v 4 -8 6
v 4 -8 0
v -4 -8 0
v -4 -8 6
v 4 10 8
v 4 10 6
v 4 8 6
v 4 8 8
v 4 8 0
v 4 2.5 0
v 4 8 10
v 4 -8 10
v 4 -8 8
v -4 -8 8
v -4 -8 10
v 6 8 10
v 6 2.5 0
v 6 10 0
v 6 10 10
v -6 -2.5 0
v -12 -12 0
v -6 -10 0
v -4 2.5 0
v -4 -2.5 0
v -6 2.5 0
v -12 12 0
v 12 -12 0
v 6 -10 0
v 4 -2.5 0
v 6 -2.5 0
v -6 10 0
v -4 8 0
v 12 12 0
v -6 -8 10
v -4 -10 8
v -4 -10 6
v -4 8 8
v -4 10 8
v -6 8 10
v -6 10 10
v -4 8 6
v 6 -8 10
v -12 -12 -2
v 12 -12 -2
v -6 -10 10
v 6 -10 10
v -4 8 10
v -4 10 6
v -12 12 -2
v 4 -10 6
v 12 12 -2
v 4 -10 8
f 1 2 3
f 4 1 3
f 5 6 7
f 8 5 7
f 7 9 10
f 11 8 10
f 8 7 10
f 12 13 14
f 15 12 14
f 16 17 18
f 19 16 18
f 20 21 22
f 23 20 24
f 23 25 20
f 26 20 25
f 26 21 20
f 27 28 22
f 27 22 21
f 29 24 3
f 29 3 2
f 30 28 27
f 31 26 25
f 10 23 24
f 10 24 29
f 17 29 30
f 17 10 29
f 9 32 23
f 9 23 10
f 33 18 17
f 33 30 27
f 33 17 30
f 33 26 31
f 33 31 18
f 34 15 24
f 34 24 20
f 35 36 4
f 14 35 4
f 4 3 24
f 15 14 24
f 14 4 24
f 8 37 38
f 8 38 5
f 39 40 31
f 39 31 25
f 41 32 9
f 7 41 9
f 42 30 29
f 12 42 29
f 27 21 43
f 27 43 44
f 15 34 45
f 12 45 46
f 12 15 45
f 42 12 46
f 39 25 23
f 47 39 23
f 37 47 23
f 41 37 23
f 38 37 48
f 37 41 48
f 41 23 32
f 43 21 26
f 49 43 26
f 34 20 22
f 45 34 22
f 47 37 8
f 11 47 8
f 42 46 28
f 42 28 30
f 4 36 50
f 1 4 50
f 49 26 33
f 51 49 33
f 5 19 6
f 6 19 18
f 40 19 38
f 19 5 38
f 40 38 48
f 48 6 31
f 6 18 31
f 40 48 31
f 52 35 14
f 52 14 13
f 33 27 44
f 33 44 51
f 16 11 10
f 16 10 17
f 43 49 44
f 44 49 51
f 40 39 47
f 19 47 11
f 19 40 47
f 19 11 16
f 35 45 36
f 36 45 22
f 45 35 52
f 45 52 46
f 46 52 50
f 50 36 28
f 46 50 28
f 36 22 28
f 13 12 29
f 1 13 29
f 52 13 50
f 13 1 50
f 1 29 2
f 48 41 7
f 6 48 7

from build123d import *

# Parameters (mm, degrees)
F0_W     = 24
F0_H     = 24
F1_DEPTH = 2
F2_DEPTH = 10
F3_SIZE2 = 9.99999
F3_SIZE  = 5.49999
F4_SIZE2 = 9.99999
F4_SIZE  = 5.49999
F5_W     = 8
F5_H     = 2
F6_DEPTH = 25


# Not quite as in the source:
# - a fillet or chamfer is up to 0.001 mm smaller than in the source, because OpenCascade refuses the exact size


with BuildPart() as f1:
    # F0 (on Top) → F1 (new body)
    with BuildSketch(Plane.XY):
        Rectangle(F0_W, F0_H)
        Polygon((-6, -10), (-6, -2.5), (-4, -2.5), (-4, -8), (0, -8), (4, -8), (4, -2.5), (6, -2.5), (6, -10), (0, -10), align=None, mode=Mode.SUBTRACT)
        Polygon((-4, 2.5), (-6, 2.5), (-6, 10), (0, 10), (6, 10), (6, 2.5), (4, 2.5), (4, 8), (0, 8), (-4, 8), align=None, mode=Mode.SUBTRACT)
        Polygon((-6, 10), (-6, 2.5), (-4, 2.5), (-4, 8), (0, 8), (4, 8), (4, 2.5), (6, 2.5), (6, 10), (0, 10), align=None)
        Polygon((-4, -2.5), (-6, -2.5), (-6, -10), (0, -10), (6, -10), (6, -2.5), (4, -2.5), (4, -8), (0, -8), (-4, -8), align=None)
    extrude(amount=-F1_DEPTH)

    # F0 (on Top) → F2 (join)
    with BuildSketch(Plane.XY):
        Polygon((-6, 10), (-6, 2.5), (-4, 2.5), (-4, 8), (0, 8), (4, 8), (4, 2.5), (6, 2.5), (6, 10), (0, 10), align=None)
        Polygon((-4, -2.5), (-6, -2.5), (-6, -10), (0, -10), (6, -10), (6, -2.5), (4, -2.5), (4, -8), (0, -8), (-4, -8), align=None)
    extrude(amount=F2_DEPTH)

    # F3 (size 5.5 and 10 in the source; OpenCascade refuses exactly that, so slightly less here)
    f3_edges = [f1.edges().sort_by_distance(p)[0] for p in [
        (-5, 2.5, 10),
        (5, 2.5, 10),
    ]]
    f3_side = f1.faces().sort_by_distance((-5.85849, 6.25, 10))[0]
    chamfer(f3_edges, length=F3_SIZE, length2=F3_SIZE2, reference=f3_side)

    # F4 (size 5.5 and 10 in the source; OpenCascade refuses exactly that, so slightly less here)
    f4_edges = [f1.edges().sort_by_distance(p)[0] for p in [
        (5, -2.5, 10),
        (-5, -2.5, 10),
    ]]
    f4_side = f1.faces().sort_by_distance((-5, -2.64151, 10))[0]
    chamfer(f4_edges, length=F4_SIZE, length2=F4_SIZE2, reference=f4_side)

    # F5 (on face) → F6 (cut)
    with BuildSketch(Plane.XZ.offset(10)):
        with Locations((0, 7)):
            Rectangle(F5_W, F5_H)
    extrude(amount=-F6_DEPTH, mode=Mode.SUBTRACT)


solid = f1.part
